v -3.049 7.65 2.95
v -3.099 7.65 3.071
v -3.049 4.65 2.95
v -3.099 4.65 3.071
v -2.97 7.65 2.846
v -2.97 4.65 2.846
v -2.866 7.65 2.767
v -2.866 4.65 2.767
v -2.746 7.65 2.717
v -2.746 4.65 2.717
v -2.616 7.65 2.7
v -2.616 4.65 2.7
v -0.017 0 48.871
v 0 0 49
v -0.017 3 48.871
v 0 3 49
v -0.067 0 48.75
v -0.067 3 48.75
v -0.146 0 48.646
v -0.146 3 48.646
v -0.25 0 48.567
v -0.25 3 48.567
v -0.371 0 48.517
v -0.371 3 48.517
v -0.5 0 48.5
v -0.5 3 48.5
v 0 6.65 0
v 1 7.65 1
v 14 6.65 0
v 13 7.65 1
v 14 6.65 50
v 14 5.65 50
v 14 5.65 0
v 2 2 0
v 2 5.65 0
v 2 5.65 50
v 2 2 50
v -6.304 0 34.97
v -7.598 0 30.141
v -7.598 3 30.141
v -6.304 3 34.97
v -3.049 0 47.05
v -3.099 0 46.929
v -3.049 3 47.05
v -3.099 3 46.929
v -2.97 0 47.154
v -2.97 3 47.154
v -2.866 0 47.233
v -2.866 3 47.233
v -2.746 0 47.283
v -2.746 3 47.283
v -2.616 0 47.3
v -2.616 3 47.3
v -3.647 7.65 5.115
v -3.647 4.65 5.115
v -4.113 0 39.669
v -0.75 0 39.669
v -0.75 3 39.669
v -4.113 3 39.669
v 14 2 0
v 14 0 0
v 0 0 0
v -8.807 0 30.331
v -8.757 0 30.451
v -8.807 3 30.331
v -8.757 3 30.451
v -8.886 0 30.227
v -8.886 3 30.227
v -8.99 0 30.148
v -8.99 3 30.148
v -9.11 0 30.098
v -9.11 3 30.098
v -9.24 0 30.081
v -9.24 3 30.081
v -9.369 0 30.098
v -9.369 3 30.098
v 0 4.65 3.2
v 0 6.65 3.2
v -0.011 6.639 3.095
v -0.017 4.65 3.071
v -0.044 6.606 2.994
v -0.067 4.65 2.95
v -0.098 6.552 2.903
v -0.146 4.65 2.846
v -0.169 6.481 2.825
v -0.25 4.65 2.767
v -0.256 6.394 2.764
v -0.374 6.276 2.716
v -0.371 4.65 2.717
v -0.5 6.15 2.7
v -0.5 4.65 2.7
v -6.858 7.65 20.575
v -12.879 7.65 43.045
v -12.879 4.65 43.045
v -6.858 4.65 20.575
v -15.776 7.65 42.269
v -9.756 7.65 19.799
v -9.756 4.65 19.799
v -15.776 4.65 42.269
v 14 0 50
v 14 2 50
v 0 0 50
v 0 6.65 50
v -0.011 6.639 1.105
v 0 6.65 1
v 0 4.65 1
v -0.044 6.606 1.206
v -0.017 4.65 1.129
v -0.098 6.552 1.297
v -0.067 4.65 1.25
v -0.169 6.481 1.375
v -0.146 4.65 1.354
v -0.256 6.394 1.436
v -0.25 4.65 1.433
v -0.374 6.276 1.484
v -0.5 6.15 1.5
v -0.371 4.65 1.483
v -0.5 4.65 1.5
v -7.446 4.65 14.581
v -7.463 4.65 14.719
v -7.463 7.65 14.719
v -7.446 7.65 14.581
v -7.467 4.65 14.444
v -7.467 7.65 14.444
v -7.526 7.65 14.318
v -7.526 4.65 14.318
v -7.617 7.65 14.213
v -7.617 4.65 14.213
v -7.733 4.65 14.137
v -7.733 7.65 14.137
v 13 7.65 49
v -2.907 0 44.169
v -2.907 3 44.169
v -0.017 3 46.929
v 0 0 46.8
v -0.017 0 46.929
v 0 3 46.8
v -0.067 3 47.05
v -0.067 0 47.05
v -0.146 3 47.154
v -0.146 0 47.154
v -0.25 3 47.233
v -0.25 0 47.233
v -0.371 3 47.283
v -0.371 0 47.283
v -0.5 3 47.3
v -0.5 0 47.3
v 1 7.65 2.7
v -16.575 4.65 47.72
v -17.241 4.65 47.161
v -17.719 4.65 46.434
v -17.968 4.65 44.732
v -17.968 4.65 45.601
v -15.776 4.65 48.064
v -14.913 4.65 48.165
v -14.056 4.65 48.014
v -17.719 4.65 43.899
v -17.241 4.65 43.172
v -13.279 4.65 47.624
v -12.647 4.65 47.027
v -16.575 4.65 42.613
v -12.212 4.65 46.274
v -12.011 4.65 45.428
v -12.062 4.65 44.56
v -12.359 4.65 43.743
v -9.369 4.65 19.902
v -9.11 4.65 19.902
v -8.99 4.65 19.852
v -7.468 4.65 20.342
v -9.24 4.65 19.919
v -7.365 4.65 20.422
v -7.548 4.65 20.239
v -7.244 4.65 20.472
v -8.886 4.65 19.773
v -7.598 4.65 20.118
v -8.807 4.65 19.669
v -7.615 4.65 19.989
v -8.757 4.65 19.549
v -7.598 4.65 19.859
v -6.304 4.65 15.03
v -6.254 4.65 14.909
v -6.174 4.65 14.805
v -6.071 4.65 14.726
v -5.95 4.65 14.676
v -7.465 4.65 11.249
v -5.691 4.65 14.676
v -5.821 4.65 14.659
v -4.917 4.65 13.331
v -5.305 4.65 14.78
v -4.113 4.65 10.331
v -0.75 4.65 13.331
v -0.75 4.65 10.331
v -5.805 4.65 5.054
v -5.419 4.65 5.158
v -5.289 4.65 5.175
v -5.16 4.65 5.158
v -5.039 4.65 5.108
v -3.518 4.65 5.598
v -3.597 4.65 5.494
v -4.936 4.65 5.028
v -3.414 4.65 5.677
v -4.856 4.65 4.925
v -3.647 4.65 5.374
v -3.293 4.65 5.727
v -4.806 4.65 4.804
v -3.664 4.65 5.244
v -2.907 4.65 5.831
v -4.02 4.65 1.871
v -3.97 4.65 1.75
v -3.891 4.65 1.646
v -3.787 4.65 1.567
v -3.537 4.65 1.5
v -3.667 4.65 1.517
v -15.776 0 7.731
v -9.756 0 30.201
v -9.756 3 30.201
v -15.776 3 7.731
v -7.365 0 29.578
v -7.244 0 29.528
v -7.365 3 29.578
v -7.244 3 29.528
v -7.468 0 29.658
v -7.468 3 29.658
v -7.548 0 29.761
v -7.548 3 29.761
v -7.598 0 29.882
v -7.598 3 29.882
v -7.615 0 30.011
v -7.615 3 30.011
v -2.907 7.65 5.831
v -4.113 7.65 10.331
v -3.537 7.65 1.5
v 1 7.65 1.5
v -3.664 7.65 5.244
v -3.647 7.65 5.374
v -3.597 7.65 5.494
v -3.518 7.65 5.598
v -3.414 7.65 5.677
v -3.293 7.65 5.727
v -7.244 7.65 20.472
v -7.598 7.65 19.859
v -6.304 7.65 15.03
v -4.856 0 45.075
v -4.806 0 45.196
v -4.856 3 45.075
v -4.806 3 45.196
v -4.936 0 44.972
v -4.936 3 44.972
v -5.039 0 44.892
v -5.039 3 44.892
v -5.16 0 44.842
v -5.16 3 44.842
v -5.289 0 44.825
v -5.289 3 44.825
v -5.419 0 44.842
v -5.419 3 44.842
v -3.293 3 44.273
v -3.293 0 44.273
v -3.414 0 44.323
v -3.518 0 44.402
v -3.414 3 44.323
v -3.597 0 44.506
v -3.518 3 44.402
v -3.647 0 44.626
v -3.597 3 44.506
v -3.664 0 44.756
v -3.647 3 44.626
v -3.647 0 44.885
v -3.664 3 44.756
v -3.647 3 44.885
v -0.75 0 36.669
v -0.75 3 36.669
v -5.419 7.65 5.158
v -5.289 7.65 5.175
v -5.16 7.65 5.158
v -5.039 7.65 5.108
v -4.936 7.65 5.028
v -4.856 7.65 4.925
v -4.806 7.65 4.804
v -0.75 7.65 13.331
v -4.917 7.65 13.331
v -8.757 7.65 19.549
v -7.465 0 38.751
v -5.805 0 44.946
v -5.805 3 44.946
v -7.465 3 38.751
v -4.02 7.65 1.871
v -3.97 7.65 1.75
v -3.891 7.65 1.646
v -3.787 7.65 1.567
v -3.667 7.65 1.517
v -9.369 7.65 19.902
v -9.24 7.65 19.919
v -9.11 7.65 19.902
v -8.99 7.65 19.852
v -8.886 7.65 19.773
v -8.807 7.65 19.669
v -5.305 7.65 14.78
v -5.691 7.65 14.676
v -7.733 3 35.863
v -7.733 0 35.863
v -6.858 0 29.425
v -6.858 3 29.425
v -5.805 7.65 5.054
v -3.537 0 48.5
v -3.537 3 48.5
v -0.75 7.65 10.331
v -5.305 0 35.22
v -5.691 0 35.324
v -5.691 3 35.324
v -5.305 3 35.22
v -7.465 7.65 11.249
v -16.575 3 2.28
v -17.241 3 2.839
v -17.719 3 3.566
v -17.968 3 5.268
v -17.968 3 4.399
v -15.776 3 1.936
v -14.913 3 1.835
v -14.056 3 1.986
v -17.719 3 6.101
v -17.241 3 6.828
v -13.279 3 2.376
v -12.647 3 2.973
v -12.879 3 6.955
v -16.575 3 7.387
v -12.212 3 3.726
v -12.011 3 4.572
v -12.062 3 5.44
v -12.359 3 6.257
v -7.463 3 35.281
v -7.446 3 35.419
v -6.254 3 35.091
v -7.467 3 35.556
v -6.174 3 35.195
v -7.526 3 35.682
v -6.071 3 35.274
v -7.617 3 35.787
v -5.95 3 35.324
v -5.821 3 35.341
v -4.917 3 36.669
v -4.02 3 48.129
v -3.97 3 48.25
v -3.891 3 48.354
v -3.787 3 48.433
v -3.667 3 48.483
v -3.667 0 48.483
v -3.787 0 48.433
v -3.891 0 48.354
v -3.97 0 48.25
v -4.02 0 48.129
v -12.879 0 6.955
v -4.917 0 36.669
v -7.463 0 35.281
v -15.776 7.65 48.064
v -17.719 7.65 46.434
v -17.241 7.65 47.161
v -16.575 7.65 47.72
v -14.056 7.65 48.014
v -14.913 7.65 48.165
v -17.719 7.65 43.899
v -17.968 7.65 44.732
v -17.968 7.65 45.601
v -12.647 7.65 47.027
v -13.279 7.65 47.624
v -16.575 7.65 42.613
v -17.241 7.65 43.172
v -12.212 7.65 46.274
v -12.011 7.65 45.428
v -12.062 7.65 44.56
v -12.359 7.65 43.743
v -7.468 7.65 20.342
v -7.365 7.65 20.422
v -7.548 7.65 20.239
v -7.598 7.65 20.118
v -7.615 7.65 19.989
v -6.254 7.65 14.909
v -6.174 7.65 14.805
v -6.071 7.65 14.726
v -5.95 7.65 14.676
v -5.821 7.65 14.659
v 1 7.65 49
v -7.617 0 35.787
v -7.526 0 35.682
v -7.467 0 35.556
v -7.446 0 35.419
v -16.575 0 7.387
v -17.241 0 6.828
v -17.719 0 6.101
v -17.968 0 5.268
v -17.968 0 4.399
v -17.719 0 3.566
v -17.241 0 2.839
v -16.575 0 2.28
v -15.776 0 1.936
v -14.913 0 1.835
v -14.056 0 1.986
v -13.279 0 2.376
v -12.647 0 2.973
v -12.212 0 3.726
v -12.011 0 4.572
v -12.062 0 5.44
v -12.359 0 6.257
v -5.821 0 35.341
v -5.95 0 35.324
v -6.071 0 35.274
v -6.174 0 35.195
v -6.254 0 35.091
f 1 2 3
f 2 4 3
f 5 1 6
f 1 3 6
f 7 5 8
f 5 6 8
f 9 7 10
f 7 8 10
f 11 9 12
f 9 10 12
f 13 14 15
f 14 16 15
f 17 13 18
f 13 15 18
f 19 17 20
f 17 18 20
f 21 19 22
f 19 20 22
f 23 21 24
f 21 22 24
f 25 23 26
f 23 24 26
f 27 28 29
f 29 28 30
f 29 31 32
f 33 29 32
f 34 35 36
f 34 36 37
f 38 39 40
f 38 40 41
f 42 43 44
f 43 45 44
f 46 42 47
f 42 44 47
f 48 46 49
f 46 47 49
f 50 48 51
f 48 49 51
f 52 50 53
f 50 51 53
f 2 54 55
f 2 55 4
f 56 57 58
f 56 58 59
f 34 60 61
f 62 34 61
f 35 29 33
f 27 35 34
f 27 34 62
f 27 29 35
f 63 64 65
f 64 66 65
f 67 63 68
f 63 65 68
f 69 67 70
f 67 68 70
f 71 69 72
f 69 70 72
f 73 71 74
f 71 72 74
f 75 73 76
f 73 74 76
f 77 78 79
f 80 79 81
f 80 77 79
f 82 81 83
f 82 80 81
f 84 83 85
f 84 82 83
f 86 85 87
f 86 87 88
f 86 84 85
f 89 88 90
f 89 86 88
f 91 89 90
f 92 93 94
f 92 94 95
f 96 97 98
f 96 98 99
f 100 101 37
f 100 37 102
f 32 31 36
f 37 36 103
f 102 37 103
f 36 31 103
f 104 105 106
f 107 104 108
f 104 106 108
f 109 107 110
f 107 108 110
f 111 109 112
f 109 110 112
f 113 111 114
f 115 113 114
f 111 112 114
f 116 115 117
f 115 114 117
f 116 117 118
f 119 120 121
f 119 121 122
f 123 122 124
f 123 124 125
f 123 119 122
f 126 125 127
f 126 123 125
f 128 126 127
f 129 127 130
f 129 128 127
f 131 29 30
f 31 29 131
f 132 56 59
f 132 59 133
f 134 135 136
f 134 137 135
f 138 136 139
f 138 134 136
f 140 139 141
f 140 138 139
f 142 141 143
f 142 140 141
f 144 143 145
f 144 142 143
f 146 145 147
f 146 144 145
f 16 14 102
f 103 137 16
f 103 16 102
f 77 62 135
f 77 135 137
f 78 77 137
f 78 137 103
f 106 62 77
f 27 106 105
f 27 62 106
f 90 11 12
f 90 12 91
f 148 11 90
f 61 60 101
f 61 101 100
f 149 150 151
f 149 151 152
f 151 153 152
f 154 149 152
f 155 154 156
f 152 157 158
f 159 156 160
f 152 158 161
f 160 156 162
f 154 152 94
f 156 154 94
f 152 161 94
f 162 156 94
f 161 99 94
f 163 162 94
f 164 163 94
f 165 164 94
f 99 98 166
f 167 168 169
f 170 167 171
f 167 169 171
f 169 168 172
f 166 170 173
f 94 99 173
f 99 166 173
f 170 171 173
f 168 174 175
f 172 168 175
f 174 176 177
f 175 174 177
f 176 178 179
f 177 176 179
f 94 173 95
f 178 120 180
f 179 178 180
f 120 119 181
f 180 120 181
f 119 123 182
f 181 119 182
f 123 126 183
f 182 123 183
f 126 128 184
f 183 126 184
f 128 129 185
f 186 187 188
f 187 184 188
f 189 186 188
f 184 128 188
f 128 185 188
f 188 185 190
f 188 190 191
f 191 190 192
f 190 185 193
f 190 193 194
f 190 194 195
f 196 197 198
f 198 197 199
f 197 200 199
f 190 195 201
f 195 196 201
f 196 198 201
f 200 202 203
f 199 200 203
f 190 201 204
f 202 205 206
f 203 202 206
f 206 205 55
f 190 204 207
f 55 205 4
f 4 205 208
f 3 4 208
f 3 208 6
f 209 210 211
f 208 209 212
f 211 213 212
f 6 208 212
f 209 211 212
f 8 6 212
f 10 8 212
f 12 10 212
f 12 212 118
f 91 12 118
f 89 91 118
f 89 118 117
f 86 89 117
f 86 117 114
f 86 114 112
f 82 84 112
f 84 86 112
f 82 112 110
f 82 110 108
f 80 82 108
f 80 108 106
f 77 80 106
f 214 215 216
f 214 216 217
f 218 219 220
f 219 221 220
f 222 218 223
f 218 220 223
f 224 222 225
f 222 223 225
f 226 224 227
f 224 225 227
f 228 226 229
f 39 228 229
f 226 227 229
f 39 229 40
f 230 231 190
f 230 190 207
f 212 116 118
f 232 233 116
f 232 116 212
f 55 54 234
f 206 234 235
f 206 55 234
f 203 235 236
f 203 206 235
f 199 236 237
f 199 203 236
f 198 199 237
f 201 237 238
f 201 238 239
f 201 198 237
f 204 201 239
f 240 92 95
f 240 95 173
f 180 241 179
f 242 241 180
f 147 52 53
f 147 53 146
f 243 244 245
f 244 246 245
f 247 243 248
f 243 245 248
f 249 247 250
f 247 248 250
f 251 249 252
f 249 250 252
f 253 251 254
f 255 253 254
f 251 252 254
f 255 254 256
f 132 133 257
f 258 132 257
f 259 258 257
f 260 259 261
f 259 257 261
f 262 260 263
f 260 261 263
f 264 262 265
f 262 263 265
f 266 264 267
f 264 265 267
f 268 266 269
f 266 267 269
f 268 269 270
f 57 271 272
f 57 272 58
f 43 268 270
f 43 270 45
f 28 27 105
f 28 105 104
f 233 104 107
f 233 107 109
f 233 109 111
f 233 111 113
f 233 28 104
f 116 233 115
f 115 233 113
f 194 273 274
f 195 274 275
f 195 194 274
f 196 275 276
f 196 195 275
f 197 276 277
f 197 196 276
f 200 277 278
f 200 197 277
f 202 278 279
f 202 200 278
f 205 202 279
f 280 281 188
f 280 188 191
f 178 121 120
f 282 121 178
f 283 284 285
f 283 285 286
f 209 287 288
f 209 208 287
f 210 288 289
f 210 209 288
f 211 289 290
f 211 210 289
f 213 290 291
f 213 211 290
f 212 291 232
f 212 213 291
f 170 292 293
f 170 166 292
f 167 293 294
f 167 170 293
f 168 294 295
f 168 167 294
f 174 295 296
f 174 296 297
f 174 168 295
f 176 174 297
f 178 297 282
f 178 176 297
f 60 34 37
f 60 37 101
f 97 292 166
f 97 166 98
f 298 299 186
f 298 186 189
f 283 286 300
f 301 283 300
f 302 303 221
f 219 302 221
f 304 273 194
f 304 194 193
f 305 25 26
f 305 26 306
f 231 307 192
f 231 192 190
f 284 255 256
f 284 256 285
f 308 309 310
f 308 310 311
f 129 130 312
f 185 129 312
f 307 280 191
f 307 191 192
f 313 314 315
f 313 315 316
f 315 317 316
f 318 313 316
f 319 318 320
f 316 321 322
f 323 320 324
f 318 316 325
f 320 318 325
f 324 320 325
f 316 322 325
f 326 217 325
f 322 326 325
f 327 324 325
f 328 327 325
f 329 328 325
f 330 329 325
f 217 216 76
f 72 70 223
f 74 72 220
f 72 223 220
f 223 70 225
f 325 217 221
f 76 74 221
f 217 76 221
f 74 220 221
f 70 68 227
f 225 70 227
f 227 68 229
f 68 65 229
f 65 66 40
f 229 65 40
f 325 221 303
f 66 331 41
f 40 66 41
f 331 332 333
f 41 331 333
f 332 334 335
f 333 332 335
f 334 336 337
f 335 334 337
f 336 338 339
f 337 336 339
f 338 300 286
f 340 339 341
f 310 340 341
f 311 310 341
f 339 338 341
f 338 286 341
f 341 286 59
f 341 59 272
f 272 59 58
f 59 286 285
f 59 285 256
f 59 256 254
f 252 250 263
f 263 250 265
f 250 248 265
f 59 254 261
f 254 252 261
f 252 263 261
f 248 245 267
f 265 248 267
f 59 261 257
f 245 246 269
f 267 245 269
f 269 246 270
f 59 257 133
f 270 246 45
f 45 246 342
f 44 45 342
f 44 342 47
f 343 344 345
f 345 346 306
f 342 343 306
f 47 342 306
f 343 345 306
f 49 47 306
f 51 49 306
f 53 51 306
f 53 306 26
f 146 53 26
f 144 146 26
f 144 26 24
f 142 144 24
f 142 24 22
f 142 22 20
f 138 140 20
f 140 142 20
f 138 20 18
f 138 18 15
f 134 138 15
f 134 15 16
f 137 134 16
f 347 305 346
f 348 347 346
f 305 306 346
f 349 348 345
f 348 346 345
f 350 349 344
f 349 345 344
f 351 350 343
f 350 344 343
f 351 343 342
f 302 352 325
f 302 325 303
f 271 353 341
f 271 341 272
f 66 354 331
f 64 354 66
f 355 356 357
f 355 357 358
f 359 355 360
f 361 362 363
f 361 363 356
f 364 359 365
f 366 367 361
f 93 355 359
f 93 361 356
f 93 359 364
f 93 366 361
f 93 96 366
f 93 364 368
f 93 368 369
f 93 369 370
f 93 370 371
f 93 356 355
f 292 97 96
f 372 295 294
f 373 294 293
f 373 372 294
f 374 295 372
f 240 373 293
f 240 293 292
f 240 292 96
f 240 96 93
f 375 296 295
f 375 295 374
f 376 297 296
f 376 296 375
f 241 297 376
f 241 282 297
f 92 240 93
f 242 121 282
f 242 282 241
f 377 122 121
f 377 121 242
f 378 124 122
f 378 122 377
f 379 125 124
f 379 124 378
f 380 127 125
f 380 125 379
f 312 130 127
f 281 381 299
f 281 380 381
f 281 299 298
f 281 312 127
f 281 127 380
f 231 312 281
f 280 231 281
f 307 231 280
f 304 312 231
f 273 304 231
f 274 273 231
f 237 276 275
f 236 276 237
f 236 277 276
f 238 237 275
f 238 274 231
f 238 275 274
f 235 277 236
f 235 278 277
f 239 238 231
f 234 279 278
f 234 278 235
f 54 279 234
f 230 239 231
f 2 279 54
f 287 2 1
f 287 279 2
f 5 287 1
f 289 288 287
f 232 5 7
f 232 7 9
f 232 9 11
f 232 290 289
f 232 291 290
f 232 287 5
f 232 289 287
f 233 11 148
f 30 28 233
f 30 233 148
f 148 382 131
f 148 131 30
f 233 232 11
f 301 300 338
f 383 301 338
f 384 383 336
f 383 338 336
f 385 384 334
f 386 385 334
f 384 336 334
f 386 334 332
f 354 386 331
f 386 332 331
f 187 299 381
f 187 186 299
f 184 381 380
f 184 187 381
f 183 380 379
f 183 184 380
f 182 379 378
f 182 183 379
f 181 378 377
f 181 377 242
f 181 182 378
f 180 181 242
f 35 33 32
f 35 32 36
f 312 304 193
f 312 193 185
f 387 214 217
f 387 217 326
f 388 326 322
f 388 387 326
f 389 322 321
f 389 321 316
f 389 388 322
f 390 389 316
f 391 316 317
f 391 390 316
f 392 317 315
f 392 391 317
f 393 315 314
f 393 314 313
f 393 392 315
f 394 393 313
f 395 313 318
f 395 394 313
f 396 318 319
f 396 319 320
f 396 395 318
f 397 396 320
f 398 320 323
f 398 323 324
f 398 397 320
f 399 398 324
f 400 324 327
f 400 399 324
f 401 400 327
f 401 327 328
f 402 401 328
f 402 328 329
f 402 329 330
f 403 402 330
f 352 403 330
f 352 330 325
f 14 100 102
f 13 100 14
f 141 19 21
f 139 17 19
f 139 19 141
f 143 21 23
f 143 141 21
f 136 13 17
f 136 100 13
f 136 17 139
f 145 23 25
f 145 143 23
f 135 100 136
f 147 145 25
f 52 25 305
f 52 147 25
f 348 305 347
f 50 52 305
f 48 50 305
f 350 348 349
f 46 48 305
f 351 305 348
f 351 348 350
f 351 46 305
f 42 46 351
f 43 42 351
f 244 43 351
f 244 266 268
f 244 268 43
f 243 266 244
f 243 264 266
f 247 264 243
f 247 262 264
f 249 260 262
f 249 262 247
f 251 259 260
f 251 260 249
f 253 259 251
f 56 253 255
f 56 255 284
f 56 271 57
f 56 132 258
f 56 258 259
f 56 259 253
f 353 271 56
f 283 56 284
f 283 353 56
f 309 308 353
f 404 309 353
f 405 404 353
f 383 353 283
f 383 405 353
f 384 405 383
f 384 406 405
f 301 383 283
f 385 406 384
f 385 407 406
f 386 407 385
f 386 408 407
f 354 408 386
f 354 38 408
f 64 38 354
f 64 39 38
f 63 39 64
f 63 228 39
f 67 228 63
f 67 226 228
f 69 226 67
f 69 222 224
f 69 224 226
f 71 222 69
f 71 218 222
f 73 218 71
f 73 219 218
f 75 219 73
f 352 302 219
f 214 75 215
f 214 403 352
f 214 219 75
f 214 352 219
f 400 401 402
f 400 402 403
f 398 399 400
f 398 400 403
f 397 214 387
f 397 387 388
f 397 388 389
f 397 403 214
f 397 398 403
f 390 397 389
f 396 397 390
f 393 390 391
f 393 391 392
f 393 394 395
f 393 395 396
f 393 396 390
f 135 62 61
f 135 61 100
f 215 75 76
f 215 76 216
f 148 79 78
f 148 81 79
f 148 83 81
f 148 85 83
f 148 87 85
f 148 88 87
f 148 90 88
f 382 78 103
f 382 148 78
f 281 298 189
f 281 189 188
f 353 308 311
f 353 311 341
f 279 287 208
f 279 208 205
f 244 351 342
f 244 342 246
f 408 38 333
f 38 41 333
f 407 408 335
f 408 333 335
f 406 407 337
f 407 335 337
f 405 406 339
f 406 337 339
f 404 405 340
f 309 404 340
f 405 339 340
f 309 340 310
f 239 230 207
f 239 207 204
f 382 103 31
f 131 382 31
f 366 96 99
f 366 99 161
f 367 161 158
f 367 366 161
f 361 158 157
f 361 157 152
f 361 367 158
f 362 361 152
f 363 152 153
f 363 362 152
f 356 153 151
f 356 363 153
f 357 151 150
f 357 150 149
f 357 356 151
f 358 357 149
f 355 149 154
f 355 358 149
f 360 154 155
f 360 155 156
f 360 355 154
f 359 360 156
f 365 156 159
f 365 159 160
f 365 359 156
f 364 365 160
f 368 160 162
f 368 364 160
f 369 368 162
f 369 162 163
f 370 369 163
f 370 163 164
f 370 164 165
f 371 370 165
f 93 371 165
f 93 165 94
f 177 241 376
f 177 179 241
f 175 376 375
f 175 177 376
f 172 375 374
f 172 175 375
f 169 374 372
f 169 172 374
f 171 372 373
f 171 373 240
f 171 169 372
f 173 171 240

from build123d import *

# Parameters (mm, degrees)
BOSS_EXTRUDE1_DEPTH = 50
BOSS_EXTRUDE2_DEPTH = 3
CIRPATTERN1_COUNT   = 2
CHAMFER1_SIZE       = 1
FILLET1_R           = 0.5
CHAMFER2_START      = -1
CHAMFER2_DEPTH      = 10


with BuildPart() as part:
    # Sketch2 → Boss-Extrude1 (new body)
    with BuildSketch(Plane.XY):
        Polygon((0, 0), (0, 7.65), (14, 7.65), (14, 5.65), (2, 5.65), (2, 2), (14, 2), (14, 0), align=None)
    extrude(amount=BOSS_EXTRUDE1_DEPTH)

    # Sketch3 → Boss-Extrude2 (add)
    with BuildSketch(Plane(origin=(0, 7.65, 0), x_dir=(1, 0, 0), z_dir=(0, 1, 0))):
        with BuildLine():
            Line((0, -2.7), (0, -1.5))
            Line((0, -1.5), (-3.920792386, -1.5))
            Line((-3.920792386, -1.5), (-4.935568127, -5.287194625))
            Line((-4.935568127, -5.287194625), (-5.804901371, -5.054257484))
            Line((-5.804901371, -5.054257484), (-8.202748881, -14.003146224))
            Line((-8.202748881, -14.003146224), (-7.333415638, -14.236083364))
            Line((-7.333415638, -14.236083364), (-8.886329908, -20.031638322))
            Line((-8.886329908, -20.031638322), (-9.755663152, -19.798701181))
            Line((-9.755663152, -19.798701181), (-15.776457135, -42.268610229))
            ThreePointArc((-15.776457135, -42.268610229), (-15.776457135, -48.064165187), (-12.878679656, -43.045067364))
            Line((-12.878679656, -43.045067364), (-6.857885673, -20.575158317))
            Line((-6.857885673, -20.575158317), (-7.727218917, -20.342221176))
            Line((-7.727218917, -20.342221176), (-6.174304646, -14.546666218))
            Line((-6.174304646, -14.546666218), (-5.304971403, -14.779603359))
            Line((-5.304971403, -14.779603359), (-4.916742835, -13.330714619))
            Line((-4.916742835, -13.330714619), (-0.75, -13.330714619))
            Line((-0.75, -13.330714619), (-0.75, -10.330714619))
            Line((-0.75, -10.330714619), (-4.112895258, -10.330714619))
            Line((-4.112895258, -10.330714619), (-2.907123892, -5.830714619))
            Line((-2.907123892, -5.830714619), (-3.776457135, -5.597777479))
            Line((-3.776457135, -5.597777479), (-3, -2.7))
            Line((-3, -2.7), (0, -2.7))
        make_face()
    boss_extrude2 = extrude(amount=-BOSS_EXTRUDE2_DEPTH)

    # CirPattern1: Boss-Extrude2 ×2 about axis
    cirpattern1_axis = Axis((0, 3.825, 25), (1, 0, 0))
    for i in range(1, CIRPATTERN1_COUNT):
        add(boss_extrude2.rotate(cirpattern1_axis, i * 360 / CIRPATTERN1_COUNT))

    # Chamfer1
    chamfer1_edges = [part.edges().sort_by_distance(p)[0] for p in [
        (0, 7.65, 26.35),
        (14, 7.65, 25),
        (0, 7.65, 0.75),
        (7, 7.65, 50),
        (7, 7.65, 0),
    ]]
    chamfer(chamfer1_edges, length=CHAMFER1_SIZE)

    # Fillet1
    fillet1_edges = [part.edges().sort_by_distance(p)[0] for p in [
        (-8.886329908, 6.15, 20.031638322),
        (-7.333415638, 6.15, 14.236083364),
        (-4.935568127, 6.15, 5.287194625),
        (-3.920792386, 6.15, 1.5),
        (0, 5.65, 1.5),
        (0, 5.65, 2.7),
        (-3, 6.15, 2.7),
        (-3.776457135, 6.15, 5.597777479),
        (-6.174304646, 6.15, 14.546666218),
        (-7.727218917, 6.15, 20.342221176),
        (-8.886329908, 1.5, 29.968361678),
        (-7.333415638, 1.5, 35.763916636),
        (-4.935568127, 1.5, 44.712805375),
        (-3.920792386, 1.5, 48.5),
        (0, 1.5, 48.5),
        (0, 1.5, 47.3),
        (-3, 1.5, 47.3),
        (-3.776457135, 1.5, 44.402222521),
        (-6.174304646, 1.5, 35.453333782),
        (-7.727218917, 1.5, 29.657778824),
    ]]
    fillet(fillet1_edges, radius=FILLET1_R)

    # Chamfer2: read off the stored shape, not the designer's step
    # Chamfer2 outline → Chamfer2 (cut)
    with BuildSketch(Plane(origin=(0, 0, 0), x_dir=(1, 0, 0), z_dir=(0, 1, 0)).offset(CHAMFER2_START)):
        with BuildLine():
            Line((-7.464876997, -38.750629138), (-7.733281129, -35.862956659))
            ThreePointArc((-7.733281129, -35.862956659), (-7.7741568, -35.879982991), (-7.816378551, -35.893326158))
            Line((-7.816378551, -35.893326158), (-8.202748881, -35.996853776))
            Line((-8.202748881, -35.996853776), (-7.464876997, -38.750629138))
        make_face()
        with BuildLine():
            Line((-7.733281129, -14.137043341), (-7.464876997, -11.249370862))
            Line((-7.464876997, -11.249370862), (-8.202748881, -14.003146224))
            Line((-8.202748881, -14.003146224), (-7.816378551, -14.106673842))
            ThreePointArc((-7.816378551, -14.106673842), (-7.7741568, -14.120017009), (-7.733281129, -14.137043341))
        make_face()
    extrude(amount=CHAMFER2_DEPTH, mode=Mode.SUBTRACT)


solid = part.part
